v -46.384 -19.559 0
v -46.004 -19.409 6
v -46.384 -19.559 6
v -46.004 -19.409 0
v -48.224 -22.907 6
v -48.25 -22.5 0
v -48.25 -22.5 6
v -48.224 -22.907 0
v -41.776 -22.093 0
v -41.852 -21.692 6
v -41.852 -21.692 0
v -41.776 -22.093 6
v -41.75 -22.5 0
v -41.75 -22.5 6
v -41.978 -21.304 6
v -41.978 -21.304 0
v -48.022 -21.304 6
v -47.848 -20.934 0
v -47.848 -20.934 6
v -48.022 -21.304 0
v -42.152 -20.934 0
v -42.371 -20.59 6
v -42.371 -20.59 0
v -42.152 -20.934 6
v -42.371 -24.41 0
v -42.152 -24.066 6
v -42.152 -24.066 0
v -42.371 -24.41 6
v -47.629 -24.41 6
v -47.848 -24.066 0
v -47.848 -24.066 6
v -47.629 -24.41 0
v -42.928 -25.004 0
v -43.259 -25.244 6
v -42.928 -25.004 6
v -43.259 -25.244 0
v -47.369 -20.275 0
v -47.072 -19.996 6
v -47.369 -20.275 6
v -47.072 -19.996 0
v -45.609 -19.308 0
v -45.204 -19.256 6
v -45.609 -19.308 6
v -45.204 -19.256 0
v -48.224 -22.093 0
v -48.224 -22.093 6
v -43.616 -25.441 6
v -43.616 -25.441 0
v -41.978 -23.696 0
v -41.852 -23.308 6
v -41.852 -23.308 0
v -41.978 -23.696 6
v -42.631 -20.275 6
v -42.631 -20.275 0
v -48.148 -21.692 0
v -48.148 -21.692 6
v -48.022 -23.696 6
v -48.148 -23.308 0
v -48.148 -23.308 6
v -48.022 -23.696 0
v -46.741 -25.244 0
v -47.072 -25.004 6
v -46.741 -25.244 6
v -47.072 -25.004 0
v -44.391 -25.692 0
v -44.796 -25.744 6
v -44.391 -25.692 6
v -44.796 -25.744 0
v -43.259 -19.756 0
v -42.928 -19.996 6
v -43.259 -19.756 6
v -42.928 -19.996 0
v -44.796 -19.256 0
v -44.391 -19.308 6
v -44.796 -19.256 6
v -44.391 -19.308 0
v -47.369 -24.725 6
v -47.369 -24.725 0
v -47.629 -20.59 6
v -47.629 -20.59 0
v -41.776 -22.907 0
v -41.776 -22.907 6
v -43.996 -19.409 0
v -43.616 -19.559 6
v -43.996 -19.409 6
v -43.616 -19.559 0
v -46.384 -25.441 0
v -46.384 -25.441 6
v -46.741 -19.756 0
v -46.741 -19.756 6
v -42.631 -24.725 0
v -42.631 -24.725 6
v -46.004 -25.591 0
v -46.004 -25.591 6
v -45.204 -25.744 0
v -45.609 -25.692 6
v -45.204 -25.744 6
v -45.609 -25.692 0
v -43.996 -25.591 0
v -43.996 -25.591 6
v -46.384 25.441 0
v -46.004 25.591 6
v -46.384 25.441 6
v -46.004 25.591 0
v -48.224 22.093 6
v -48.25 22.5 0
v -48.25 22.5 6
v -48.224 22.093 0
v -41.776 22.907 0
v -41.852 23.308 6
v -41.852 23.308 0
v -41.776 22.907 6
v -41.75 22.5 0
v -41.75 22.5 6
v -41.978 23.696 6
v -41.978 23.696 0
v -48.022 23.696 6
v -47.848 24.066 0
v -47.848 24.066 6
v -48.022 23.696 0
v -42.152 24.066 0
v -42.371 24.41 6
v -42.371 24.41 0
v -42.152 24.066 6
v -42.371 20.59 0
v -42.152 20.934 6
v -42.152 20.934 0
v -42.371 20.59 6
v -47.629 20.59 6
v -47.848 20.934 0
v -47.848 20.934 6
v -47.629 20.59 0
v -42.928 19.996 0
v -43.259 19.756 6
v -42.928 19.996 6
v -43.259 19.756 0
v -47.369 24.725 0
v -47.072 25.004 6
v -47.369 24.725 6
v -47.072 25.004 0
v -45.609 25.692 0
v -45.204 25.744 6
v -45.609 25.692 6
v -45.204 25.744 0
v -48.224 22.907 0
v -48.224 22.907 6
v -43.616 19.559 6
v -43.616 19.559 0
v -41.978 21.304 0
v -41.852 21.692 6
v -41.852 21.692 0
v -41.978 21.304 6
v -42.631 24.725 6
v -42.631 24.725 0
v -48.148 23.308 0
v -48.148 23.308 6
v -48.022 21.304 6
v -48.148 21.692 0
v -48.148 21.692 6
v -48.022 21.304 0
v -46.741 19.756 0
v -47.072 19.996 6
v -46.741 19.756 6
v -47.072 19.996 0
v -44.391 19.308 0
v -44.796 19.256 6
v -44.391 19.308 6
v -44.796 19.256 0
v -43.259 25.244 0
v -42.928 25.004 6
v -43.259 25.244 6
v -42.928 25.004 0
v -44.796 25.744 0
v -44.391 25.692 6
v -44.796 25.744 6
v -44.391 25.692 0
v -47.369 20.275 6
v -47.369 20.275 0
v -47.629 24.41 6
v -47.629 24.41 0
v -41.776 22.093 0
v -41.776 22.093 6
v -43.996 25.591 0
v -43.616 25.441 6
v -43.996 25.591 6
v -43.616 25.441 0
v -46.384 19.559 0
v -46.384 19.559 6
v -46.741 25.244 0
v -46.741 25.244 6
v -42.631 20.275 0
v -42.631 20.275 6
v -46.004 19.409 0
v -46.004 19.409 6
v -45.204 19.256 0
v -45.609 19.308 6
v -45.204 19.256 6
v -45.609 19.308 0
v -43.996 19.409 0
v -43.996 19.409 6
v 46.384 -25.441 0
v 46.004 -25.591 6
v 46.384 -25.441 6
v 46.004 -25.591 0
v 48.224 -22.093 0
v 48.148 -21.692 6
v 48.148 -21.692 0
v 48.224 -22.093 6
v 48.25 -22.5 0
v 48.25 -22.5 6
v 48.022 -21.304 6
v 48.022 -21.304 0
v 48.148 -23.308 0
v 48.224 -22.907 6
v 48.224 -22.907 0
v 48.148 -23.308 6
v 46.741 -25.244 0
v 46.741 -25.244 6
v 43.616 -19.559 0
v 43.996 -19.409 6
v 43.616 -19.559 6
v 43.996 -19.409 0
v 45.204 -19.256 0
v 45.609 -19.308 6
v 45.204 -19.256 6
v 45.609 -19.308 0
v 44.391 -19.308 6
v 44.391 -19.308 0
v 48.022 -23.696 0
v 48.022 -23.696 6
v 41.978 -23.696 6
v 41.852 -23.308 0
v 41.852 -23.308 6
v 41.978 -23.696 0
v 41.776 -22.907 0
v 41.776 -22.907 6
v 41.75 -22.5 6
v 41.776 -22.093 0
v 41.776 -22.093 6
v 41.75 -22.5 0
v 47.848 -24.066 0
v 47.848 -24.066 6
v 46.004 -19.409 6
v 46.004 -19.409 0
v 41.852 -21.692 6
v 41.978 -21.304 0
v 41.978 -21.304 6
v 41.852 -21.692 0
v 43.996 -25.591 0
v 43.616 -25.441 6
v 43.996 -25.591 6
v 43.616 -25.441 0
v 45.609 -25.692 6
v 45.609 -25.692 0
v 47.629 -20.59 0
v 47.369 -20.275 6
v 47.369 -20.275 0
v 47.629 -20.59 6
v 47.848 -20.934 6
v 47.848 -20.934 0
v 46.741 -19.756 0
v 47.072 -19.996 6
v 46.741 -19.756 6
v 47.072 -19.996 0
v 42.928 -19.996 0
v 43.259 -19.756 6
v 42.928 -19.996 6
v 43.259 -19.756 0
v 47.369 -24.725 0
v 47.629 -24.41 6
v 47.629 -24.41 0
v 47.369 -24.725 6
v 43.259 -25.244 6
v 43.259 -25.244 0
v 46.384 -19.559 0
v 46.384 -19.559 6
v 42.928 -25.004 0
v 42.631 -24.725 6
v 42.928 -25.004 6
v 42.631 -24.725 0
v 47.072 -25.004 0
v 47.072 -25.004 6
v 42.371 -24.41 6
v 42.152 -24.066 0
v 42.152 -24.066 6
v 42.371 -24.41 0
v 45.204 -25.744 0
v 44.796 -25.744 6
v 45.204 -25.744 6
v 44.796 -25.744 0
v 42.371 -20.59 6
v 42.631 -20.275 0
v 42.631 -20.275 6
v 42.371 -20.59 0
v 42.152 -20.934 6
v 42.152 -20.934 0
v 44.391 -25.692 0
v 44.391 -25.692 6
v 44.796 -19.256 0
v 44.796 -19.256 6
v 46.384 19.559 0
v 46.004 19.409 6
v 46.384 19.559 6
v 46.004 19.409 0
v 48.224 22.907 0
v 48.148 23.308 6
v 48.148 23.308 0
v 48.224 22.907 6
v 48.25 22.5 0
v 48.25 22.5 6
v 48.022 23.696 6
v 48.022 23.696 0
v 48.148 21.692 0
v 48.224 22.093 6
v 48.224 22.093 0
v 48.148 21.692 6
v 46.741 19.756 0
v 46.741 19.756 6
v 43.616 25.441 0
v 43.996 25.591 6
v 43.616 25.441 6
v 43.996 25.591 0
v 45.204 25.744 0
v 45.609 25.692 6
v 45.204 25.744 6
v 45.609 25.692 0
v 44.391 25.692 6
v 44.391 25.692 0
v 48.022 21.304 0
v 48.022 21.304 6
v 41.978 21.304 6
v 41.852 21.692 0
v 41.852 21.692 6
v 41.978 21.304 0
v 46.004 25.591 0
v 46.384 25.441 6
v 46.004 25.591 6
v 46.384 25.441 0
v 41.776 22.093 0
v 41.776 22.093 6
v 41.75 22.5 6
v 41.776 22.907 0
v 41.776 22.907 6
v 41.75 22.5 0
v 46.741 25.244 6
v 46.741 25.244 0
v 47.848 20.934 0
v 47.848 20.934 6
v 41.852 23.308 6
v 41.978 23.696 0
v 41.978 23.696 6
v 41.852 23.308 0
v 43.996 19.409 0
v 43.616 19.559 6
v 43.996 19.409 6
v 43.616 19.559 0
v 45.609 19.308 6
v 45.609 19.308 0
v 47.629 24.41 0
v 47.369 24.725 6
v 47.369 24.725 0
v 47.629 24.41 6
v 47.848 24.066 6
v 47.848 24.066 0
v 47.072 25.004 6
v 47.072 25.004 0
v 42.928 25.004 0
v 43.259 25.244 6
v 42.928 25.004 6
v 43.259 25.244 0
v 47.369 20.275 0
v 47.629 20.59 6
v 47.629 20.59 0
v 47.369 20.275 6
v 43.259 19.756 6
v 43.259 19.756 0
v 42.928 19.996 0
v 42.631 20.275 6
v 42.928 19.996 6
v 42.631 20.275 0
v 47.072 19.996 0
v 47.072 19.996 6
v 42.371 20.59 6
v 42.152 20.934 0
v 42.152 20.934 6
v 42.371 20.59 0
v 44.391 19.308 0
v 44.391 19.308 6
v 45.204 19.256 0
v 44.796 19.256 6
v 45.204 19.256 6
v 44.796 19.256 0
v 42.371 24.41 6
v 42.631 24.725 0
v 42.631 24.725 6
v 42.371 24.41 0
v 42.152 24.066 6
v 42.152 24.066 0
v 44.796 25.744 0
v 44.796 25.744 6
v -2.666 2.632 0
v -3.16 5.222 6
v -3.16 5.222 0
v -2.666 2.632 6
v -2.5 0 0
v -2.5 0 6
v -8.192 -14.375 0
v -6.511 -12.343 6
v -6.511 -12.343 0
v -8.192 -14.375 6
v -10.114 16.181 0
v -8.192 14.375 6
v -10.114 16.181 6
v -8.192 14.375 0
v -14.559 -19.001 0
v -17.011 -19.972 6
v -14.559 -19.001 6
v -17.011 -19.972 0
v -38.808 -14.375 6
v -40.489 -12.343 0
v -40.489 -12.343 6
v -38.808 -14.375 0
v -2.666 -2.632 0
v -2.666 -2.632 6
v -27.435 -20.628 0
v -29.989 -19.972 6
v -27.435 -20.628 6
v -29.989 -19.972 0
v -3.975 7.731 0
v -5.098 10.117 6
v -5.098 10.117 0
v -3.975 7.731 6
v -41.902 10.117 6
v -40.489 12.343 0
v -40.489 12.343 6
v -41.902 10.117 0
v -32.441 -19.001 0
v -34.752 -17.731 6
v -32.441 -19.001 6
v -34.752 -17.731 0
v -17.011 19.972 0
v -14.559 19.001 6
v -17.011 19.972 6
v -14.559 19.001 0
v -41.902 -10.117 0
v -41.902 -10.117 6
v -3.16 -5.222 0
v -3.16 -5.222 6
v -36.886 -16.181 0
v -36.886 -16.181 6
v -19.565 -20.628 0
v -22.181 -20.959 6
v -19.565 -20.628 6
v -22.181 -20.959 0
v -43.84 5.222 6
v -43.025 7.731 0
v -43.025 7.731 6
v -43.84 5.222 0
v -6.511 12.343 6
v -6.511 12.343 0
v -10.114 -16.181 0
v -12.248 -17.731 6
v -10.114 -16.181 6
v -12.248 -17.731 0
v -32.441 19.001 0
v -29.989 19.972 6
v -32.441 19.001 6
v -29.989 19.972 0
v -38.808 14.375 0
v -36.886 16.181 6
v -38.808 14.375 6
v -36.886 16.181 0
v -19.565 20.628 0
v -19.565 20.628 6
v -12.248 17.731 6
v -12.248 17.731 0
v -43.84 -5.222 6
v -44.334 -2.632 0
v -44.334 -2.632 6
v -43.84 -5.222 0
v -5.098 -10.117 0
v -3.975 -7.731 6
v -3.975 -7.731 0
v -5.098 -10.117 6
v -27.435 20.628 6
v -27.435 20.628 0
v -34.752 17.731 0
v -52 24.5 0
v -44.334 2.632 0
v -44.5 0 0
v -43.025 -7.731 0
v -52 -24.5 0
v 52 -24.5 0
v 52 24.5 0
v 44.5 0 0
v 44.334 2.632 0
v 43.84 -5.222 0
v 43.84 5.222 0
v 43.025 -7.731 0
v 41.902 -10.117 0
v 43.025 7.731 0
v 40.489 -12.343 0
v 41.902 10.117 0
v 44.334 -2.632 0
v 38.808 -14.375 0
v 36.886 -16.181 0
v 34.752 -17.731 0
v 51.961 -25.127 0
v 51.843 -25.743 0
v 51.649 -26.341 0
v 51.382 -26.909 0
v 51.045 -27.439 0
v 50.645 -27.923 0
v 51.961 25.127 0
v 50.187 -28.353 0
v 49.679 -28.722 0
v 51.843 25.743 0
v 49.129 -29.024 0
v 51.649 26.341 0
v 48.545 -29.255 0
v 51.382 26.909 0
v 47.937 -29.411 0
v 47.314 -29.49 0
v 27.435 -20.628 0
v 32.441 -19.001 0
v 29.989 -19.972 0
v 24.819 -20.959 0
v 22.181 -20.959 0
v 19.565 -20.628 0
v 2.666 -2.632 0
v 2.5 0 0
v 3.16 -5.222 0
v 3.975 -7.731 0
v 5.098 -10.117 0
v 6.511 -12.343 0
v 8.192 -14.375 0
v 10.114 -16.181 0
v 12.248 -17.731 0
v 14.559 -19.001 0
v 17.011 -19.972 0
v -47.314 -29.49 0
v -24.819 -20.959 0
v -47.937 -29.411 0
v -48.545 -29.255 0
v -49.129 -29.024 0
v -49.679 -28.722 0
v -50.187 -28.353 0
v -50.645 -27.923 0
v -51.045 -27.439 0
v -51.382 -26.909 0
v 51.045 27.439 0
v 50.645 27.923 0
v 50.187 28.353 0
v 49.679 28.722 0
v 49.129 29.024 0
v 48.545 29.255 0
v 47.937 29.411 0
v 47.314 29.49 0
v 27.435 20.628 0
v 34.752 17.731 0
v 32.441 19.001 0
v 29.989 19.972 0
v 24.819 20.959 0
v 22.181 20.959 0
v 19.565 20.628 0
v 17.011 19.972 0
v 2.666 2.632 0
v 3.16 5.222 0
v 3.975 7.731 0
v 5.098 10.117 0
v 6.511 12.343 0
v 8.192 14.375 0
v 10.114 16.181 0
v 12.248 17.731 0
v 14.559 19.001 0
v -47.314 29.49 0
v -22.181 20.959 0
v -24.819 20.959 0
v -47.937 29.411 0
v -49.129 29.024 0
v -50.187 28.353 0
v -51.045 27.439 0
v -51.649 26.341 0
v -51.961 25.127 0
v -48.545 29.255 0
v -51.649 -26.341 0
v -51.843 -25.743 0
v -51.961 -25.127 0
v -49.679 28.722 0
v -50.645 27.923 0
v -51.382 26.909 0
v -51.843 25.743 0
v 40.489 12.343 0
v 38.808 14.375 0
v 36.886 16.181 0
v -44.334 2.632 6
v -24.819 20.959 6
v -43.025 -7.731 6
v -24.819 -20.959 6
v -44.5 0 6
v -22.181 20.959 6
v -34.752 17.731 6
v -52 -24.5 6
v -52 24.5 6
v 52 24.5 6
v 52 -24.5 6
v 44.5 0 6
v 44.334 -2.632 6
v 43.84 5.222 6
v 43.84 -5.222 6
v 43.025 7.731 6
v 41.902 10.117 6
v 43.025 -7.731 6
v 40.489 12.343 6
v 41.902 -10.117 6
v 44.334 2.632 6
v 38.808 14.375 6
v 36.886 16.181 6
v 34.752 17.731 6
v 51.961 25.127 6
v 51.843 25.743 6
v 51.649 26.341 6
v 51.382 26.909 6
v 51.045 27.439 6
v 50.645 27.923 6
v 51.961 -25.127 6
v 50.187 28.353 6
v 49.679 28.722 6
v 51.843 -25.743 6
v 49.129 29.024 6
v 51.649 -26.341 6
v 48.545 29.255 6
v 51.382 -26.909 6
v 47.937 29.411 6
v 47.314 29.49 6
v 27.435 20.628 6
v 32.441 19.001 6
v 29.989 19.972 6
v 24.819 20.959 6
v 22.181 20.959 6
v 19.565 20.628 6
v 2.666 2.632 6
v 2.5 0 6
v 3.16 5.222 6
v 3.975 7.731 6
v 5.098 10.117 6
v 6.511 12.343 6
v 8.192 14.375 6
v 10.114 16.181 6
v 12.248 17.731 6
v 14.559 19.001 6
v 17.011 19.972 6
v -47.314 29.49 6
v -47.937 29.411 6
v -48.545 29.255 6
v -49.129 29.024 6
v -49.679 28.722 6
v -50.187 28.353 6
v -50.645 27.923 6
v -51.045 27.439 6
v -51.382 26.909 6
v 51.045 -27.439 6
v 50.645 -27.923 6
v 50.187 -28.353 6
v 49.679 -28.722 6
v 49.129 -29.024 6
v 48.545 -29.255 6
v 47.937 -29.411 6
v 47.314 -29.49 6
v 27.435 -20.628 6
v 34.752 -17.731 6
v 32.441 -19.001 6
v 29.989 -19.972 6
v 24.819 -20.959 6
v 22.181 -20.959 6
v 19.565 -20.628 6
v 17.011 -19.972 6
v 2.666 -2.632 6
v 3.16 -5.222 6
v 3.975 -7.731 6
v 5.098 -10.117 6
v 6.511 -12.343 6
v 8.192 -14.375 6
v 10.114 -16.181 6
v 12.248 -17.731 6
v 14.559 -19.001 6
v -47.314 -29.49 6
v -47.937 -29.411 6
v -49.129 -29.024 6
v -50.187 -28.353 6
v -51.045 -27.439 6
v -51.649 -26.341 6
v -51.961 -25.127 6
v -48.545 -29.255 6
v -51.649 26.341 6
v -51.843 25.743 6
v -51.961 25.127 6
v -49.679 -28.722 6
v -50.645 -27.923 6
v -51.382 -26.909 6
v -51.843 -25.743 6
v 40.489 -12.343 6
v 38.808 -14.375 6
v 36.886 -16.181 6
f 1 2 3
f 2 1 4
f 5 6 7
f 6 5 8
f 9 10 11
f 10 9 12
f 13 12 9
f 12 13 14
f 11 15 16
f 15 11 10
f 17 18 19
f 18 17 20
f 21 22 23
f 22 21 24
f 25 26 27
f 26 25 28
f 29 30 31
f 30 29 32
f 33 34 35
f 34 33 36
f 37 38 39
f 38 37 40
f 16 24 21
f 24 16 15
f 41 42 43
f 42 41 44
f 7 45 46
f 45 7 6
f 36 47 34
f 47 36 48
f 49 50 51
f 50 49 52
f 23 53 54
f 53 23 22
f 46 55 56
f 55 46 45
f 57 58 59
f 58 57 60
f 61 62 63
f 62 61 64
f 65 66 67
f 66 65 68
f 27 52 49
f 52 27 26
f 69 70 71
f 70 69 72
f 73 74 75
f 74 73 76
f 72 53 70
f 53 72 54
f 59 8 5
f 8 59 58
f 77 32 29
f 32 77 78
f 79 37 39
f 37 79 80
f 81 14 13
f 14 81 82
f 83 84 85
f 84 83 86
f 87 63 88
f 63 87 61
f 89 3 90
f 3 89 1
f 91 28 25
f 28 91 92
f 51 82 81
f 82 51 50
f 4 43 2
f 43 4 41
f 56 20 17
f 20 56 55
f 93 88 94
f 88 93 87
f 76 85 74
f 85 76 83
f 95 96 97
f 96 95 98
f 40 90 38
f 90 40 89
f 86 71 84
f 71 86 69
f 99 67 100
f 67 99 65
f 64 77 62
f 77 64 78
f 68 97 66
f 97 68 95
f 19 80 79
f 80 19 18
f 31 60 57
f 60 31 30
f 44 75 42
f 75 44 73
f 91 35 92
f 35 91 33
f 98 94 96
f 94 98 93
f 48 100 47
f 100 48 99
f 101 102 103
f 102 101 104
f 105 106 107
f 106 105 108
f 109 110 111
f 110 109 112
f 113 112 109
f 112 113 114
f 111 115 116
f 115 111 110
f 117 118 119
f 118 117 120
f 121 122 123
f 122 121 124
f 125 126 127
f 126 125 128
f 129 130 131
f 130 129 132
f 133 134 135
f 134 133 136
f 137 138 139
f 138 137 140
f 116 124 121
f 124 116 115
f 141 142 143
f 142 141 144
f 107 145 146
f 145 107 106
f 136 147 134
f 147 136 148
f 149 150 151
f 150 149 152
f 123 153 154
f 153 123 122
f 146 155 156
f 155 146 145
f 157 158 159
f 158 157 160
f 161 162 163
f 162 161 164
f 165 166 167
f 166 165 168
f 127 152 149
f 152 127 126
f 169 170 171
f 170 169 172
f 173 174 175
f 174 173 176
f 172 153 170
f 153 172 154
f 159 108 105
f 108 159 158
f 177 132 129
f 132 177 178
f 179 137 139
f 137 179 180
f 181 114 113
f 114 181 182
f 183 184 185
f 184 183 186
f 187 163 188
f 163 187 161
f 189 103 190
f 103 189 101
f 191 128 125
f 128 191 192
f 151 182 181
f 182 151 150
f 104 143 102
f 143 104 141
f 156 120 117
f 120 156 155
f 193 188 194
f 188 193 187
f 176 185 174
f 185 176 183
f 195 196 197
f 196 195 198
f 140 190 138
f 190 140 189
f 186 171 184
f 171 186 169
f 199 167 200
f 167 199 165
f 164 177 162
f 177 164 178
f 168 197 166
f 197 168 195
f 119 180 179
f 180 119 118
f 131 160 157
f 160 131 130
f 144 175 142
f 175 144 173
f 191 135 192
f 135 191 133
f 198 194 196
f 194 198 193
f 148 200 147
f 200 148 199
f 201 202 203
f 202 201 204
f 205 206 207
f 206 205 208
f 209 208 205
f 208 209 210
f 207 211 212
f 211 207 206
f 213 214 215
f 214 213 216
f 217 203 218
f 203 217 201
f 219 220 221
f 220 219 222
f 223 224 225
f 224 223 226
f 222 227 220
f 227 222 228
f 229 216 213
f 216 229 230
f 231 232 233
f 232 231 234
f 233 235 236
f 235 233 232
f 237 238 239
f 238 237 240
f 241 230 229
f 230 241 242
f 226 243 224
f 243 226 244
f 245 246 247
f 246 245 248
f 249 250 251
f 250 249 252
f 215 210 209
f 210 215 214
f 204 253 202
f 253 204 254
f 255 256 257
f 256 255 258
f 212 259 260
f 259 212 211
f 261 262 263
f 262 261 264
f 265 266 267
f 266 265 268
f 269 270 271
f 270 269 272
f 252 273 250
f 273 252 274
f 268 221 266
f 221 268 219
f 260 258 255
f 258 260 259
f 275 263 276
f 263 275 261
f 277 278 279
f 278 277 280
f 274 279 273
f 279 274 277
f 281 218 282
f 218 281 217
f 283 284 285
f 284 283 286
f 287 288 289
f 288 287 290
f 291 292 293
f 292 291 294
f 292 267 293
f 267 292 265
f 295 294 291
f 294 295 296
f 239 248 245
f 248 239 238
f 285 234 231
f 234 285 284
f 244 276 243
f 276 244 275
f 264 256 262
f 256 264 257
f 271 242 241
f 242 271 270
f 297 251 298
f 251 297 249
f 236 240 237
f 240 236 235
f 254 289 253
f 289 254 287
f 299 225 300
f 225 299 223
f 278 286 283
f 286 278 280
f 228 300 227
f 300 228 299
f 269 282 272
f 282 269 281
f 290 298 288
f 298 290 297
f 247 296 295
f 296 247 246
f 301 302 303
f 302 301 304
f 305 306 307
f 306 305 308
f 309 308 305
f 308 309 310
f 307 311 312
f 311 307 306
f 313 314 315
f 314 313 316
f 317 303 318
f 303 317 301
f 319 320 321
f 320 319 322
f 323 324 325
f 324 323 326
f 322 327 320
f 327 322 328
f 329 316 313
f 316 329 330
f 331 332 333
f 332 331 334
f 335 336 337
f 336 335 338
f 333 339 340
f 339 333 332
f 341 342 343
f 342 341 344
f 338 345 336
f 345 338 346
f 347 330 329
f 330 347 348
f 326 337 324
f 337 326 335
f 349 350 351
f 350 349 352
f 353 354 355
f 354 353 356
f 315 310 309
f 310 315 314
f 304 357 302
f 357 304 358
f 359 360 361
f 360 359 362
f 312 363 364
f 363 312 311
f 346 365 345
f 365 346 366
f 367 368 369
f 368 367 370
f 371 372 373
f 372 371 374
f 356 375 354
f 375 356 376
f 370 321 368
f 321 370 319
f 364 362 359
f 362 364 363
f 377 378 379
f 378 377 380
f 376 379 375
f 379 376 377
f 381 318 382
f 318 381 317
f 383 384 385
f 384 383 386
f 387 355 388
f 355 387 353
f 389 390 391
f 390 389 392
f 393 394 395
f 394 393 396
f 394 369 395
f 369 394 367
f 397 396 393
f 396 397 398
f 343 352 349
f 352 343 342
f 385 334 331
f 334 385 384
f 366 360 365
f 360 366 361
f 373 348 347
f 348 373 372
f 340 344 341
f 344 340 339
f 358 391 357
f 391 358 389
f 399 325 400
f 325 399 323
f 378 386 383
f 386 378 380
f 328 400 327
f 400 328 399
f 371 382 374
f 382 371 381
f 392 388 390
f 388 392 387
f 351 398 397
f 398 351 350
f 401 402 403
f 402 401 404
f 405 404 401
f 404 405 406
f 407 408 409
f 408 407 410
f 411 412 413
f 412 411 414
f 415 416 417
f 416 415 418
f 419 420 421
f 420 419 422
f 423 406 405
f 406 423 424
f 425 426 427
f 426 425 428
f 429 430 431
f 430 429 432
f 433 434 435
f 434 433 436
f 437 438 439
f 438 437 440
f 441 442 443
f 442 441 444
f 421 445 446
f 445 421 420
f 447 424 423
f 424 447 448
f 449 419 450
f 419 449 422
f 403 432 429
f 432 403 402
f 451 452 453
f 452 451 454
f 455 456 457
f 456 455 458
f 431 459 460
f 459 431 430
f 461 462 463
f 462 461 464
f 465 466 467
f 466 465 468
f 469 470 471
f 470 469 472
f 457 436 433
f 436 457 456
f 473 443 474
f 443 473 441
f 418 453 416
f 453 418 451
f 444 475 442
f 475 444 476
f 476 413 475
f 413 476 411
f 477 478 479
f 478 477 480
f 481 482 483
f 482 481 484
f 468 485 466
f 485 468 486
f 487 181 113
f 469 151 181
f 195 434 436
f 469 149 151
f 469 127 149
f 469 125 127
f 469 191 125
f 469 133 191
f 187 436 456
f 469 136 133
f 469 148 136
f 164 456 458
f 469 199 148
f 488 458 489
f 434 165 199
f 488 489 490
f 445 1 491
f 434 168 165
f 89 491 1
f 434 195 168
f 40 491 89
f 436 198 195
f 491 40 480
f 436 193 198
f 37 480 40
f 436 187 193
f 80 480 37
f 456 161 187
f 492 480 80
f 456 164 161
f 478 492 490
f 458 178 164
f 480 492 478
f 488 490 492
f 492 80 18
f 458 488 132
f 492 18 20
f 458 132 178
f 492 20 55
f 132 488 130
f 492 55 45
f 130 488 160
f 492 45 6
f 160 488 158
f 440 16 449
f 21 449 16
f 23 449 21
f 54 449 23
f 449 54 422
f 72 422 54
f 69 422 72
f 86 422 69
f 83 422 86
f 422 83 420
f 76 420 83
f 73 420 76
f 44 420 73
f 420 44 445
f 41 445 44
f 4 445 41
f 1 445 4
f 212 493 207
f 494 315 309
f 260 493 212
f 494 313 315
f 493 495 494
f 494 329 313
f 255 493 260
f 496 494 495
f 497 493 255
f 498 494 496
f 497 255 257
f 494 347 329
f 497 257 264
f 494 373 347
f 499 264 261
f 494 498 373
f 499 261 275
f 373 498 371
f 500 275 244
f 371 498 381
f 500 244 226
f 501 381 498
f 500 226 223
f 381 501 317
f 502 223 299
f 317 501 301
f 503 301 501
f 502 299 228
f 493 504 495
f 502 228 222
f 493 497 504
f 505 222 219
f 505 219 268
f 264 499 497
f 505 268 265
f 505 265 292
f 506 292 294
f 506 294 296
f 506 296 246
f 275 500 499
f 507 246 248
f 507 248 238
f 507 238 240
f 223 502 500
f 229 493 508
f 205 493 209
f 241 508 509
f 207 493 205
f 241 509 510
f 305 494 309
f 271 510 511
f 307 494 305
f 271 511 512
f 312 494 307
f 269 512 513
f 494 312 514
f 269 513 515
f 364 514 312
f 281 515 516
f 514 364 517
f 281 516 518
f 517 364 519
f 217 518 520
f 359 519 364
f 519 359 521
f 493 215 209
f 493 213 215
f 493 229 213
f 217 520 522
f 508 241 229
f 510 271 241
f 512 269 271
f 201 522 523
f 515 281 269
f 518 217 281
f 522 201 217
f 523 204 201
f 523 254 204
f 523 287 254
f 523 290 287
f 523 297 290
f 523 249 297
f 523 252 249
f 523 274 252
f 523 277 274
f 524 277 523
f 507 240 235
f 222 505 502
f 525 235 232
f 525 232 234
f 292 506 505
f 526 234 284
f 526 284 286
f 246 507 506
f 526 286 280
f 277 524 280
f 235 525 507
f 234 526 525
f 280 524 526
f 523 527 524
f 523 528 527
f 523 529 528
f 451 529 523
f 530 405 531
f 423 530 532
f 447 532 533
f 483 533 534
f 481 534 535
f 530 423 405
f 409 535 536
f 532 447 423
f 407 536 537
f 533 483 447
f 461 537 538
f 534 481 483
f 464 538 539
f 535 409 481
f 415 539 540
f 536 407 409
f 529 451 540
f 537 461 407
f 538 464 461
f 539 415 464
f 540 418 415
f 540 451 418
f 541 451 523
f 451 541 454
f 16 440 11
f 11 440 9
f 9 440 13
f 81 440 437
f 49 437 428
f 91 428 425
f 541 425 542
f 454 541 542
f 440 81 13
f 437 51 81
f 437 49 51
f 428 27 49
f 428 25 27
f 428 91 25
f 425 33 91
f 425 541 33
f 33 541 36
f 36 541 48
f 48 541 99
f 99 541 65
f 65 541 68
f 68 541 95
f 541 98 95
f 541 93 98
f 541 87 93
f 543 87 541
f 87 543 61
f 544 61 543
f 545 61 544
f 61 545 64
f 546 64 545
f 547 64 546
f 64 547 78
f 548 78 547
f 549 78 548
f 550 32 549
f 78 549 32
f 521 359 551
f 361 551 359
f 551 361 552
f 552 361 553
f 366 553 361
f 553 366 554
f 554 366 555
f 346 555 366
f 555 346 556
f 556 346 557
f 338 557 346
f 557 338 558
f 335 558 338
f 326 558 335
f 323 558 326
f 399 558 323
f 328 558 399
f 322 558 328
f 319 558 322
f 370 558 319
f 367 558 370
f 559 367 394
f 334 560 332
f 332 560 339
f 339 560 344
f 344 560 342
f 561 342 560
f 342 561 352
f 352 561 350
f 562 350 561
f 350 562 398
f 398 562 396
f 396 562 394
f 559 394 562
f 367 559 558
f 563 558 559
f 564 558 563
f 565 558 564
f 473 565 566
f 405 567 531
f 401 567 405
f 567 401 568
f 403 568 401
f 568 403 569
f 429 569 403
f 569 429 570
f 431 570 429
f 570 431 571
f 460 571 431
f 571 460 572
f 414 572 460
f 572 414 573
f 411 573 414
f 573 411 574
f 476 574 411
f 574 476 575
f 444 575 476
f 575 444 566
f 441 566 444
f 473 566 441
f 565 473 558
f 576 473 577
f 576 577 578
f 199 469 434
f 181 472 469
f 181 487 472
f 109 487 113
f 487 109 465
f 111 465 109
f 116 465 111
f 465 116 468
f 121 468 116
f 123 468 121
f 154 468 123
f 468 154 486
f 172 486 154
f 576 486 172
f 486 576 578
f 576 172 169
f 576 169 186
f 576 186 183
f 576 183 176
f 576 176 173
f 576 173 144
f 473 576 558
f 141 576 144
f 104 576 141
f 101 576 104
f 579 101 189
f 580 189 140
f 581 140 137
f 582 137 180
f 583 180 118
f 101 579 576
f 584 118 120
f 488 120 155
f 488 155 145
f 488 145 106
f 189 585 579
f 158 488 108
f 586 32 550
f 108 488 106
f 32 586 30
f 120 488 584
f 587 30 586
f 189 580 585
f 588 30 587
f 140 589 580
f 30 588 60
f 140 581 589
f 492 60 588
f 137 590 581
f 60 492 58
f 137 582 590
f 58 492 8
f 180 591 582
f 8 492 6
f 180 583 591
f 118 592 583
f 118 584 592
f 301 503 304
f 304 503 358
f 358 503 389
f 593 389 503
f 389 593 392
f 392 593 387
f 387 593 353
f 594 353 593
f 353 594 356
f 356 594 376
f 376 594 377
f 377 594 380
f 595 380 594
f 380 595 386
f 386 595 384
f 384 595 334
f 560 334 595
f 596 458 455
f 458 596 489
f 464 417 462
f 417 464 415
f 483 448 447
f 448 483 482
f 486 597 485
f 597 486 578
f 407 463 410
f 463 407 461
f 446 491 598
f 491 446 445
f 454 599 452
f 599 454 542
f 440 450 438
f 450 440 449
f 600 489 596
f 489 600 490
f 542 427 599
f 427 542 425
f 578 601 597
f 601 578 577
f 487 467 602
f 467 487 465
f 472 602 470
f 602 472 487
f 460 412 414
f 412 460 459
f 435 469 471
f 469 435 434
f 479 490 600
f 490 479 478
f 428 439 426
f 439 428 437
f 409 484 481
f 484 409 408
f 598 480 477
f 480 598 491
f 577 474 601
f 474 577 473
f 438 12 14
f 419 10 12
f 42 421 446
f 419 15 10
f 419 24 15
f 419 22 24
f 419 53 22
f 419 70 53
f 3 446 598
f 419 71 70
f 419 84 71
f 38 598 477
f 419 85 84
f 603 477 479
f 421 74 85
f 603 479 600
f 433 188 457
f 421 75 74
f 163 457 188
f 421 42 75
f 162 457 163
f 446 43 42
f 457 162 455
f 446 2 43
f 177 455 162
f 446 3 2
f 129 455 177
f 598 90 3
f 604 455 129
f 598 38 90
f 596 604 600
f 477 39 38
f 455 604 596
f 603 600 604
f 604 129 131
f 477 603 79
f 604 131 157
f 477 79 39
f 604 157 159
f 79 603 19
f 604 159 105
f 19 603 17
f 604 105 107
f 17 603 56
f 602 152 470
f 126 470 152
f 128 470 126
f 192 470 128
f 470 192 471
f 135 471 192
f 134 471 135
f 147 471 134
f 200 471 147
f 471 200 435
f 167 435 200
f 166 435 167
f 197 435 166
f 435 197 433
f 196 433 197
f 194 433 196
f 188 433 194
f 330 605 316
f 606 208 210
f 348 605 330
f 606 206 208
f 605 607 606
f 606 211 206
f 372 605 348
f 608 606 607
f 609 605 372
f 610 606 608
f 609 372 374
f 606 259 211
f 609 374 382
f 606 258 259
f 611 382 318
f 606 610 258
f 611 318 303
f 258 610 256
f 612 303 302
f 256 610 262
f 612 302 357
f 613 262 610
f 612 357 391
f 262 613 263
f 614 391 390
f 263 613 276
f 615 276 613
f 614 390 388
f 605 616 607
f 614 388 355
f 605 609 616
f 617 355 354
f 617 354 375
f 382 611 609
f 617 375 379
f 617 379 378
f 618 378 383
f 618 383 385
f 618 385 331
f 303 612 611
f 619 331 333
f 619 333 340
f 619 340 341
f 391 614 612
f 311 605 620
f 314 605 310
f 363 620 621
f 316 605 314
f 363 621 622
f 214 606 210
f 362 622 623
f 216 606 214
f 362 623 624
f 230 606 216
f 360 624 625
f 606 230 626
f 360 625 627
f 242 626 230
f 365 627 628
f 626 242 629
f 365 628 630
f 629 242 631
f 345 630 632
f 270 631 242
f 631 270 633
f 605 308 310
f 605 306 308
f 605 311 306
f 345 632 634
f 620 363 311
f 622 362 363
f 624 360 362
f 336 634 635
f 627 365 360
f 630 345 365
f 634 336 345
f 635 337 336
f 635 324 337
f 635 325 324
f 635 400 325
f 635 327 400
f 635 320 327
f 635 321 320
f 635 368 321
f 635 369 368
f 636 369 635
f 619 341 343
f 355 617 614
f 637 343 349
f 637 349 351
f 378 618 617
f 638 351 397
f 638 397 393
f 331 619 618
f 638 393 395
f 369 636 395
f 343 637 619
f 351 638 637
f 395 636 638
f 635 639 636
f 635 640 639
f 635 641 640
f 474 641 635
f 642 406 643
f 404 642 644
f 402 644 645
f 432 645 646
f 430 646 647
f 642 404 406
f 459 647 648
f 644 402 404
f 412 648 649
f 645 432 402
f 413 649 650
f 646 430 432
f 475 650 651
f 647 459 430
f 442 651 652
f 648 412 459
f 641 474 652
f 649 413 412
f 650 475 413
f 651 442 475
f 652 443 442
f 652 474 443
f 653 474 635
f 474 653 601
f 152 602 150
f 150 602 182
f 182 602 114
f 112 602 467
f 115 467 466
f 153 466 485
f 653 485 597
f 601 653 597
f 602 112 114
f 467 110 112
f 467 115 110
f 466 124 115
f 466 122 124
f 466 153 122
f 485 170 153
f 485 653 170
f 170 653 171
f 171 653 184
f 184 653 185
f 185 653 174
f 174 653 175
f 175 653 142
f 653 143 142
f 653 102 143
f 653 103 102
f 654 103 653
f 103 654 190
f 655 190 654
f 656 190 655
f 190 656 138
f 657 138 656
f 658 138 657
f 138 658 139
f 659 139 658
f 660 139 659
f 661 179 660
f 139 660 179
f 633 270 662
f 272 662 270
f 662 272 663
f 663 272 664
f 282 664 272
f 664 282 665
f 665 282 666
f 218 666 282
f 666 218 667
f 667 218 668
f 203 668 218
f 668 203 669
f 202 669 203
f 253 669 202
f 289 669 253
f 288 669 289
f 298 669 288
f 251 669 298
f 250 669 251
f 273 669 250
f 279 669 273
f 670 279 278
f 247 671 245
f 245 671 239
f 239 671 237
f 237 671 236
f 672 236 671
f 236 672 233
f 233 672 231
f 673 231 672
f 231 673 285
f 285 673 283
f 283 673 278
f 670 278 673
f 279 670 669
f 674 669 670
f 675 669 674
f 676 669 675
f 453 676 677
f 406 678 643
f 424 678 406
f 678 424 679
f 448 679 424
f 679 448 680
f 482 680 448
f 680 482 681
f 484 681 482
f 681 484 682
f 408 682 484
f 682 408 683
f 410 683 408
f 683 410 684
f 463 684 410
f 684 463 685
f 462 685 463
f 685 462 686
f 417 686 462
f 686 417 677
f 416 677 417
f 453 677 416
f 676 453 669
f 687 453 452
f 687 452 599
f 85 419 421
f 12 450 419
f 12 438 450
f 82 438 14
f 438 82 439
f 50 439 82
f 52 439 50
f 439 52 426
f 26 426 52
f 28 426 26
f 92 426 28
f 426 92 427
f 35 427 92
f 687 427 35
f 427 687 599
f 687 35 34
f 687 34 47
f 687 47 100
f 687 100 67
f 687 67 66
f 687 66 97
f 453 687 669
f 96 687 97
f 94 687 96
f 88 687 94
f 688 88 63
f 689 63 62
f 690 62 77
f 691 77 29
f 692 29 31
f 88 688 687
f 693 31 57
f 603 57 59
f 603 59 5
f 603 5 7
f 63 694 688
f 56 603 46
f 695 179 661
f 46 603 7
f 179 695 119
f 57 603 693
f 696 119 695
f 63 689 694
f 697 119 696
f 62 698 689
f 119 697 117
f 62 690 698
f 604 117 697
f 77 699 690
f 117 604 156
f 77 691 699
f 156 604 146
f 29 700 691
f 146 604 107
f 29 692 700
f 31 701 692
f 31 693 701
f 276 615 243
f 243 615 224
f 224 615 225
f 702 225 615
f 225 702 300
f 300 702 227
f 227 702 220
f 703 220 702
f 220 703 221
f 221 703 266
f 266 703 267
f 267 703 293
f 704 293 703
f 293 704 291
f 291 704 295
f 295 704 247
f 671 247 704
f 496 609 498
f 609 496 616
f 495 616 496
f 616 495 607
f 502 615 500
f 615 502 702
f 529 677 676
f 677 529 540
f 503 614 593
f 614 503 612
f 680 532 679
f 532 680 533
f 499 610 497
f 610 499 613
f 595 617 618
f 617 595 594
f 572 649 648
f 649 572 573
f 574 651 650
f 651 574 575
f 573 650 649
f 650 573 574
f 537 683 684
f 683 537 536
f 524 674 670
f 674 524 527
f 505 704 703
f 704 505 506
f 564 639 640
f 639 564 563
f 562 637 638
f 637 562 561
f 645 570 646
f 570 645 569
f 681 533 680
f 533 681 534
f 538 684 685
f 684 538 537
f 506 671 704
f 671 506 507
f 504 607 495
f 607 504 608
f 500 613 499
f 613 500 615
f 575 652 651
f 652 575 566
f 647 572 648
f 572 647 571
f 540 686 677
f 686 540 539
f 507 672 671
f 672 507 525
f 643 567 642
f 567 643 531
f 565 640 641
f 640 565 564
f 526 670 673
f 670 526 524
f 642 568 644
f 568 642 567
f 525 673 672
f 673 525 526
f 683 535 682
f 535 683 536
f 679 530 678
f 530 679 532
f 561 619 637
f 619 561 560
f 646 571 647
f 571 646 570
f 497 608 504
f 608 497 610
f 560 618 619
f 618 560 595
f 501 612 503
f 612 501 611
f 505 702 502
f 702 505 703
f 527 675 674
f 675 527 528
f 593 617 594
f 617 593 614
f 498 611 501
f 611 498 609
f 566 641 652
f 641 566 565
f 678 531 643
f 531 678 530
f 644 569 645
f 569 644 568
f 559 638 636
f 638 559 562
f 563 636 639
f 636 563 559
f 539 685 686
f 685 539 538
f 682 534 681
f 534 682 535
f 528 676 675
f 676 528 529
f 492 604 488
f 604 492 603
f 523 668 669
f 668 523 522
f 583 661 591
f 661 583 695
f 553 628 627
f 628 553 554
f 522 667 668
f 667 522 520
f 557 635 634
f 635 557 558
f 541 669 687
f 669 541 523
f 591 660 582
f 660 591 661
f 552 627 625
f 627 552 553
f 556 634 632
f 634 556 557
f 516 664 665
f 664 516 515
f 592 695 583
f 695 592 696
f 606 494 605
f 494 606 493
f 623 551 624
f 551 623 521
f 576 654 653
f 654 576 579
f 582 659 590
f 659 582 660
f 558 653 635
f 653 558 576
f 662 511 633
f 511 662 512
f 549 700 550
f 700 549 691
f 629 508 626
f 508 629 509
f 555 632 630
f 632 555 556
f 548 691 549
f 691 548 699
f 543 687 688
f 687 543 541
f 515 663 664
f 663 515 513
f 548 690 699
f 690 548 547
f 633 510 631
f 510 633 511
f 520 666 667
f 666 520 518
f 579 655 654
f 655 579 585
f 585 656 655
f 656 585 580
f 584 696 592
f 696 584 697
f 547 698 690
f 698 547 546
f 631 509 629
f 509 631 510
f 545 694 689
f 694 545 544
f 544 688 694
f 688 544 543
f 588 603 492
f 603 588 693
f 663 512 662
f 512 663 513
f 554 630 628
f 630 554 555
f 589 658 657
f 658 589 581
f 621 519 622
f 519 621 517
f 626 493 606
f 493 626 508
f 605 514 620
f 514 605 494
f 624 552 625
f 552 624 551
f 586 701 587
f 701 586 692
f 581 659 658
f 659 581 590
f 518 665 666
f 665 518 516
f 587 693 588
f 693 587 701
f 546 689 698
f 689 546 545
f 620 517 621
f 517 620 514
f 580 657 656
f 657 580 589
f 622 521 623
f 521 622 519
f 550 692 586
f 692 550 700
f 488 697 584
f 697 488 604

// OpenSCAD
$fn = 50;


difference() {
	union() {
		hull() {
			translate(v = [-47.0000000000, 24.5000000000, 0]) {
				cylinder(h = 6, r = 5);
			}
			translate(v = [47.0000000000, 24.5000000000, 0]) {
				cylinder(h = 6, r = 5);
			}
			translate(v = [-47.0000000000, -24.5000000000, 0]) {
				cylinder(h = 6, r = 5);
			}
			translate(v = [47.0000000000, -24.5000000000, 0]) {
				cylinder(h = 6, r = 5);
			}
		}
	}
	union() {
		#translate(v = [-45.0000000000, -22.5000000000, -100.0000000000]) {
			cylinder(h = 200, r = 3.2500000000);
		}
		#translate(v = [-45.0000000000, 22.5000000000, -100.0000000000]) {
			cylinder(h = 200, r = 3.2500000000);
		}
		#translate(v = [45.0000000000, -22.5000000000, -100.0000000000]) {
			cylinder(h = 200, r = 3.2500000000);
		}
		#translate(v = [45.0000000000, 22.5000000000, -100.0000000000]) {
			cylinder(h = 200, r = 3.2500000000);
		}
		#translate(v = [-23.5000000000, 0, 0]) {
			cylinder(h = 6, r = 21.0000000000);
		}
		#translate(v = [23.5000000000, 0, 0]) {
			cylinder(h = 6, r = 21.0000000000);
		}
	}
}
